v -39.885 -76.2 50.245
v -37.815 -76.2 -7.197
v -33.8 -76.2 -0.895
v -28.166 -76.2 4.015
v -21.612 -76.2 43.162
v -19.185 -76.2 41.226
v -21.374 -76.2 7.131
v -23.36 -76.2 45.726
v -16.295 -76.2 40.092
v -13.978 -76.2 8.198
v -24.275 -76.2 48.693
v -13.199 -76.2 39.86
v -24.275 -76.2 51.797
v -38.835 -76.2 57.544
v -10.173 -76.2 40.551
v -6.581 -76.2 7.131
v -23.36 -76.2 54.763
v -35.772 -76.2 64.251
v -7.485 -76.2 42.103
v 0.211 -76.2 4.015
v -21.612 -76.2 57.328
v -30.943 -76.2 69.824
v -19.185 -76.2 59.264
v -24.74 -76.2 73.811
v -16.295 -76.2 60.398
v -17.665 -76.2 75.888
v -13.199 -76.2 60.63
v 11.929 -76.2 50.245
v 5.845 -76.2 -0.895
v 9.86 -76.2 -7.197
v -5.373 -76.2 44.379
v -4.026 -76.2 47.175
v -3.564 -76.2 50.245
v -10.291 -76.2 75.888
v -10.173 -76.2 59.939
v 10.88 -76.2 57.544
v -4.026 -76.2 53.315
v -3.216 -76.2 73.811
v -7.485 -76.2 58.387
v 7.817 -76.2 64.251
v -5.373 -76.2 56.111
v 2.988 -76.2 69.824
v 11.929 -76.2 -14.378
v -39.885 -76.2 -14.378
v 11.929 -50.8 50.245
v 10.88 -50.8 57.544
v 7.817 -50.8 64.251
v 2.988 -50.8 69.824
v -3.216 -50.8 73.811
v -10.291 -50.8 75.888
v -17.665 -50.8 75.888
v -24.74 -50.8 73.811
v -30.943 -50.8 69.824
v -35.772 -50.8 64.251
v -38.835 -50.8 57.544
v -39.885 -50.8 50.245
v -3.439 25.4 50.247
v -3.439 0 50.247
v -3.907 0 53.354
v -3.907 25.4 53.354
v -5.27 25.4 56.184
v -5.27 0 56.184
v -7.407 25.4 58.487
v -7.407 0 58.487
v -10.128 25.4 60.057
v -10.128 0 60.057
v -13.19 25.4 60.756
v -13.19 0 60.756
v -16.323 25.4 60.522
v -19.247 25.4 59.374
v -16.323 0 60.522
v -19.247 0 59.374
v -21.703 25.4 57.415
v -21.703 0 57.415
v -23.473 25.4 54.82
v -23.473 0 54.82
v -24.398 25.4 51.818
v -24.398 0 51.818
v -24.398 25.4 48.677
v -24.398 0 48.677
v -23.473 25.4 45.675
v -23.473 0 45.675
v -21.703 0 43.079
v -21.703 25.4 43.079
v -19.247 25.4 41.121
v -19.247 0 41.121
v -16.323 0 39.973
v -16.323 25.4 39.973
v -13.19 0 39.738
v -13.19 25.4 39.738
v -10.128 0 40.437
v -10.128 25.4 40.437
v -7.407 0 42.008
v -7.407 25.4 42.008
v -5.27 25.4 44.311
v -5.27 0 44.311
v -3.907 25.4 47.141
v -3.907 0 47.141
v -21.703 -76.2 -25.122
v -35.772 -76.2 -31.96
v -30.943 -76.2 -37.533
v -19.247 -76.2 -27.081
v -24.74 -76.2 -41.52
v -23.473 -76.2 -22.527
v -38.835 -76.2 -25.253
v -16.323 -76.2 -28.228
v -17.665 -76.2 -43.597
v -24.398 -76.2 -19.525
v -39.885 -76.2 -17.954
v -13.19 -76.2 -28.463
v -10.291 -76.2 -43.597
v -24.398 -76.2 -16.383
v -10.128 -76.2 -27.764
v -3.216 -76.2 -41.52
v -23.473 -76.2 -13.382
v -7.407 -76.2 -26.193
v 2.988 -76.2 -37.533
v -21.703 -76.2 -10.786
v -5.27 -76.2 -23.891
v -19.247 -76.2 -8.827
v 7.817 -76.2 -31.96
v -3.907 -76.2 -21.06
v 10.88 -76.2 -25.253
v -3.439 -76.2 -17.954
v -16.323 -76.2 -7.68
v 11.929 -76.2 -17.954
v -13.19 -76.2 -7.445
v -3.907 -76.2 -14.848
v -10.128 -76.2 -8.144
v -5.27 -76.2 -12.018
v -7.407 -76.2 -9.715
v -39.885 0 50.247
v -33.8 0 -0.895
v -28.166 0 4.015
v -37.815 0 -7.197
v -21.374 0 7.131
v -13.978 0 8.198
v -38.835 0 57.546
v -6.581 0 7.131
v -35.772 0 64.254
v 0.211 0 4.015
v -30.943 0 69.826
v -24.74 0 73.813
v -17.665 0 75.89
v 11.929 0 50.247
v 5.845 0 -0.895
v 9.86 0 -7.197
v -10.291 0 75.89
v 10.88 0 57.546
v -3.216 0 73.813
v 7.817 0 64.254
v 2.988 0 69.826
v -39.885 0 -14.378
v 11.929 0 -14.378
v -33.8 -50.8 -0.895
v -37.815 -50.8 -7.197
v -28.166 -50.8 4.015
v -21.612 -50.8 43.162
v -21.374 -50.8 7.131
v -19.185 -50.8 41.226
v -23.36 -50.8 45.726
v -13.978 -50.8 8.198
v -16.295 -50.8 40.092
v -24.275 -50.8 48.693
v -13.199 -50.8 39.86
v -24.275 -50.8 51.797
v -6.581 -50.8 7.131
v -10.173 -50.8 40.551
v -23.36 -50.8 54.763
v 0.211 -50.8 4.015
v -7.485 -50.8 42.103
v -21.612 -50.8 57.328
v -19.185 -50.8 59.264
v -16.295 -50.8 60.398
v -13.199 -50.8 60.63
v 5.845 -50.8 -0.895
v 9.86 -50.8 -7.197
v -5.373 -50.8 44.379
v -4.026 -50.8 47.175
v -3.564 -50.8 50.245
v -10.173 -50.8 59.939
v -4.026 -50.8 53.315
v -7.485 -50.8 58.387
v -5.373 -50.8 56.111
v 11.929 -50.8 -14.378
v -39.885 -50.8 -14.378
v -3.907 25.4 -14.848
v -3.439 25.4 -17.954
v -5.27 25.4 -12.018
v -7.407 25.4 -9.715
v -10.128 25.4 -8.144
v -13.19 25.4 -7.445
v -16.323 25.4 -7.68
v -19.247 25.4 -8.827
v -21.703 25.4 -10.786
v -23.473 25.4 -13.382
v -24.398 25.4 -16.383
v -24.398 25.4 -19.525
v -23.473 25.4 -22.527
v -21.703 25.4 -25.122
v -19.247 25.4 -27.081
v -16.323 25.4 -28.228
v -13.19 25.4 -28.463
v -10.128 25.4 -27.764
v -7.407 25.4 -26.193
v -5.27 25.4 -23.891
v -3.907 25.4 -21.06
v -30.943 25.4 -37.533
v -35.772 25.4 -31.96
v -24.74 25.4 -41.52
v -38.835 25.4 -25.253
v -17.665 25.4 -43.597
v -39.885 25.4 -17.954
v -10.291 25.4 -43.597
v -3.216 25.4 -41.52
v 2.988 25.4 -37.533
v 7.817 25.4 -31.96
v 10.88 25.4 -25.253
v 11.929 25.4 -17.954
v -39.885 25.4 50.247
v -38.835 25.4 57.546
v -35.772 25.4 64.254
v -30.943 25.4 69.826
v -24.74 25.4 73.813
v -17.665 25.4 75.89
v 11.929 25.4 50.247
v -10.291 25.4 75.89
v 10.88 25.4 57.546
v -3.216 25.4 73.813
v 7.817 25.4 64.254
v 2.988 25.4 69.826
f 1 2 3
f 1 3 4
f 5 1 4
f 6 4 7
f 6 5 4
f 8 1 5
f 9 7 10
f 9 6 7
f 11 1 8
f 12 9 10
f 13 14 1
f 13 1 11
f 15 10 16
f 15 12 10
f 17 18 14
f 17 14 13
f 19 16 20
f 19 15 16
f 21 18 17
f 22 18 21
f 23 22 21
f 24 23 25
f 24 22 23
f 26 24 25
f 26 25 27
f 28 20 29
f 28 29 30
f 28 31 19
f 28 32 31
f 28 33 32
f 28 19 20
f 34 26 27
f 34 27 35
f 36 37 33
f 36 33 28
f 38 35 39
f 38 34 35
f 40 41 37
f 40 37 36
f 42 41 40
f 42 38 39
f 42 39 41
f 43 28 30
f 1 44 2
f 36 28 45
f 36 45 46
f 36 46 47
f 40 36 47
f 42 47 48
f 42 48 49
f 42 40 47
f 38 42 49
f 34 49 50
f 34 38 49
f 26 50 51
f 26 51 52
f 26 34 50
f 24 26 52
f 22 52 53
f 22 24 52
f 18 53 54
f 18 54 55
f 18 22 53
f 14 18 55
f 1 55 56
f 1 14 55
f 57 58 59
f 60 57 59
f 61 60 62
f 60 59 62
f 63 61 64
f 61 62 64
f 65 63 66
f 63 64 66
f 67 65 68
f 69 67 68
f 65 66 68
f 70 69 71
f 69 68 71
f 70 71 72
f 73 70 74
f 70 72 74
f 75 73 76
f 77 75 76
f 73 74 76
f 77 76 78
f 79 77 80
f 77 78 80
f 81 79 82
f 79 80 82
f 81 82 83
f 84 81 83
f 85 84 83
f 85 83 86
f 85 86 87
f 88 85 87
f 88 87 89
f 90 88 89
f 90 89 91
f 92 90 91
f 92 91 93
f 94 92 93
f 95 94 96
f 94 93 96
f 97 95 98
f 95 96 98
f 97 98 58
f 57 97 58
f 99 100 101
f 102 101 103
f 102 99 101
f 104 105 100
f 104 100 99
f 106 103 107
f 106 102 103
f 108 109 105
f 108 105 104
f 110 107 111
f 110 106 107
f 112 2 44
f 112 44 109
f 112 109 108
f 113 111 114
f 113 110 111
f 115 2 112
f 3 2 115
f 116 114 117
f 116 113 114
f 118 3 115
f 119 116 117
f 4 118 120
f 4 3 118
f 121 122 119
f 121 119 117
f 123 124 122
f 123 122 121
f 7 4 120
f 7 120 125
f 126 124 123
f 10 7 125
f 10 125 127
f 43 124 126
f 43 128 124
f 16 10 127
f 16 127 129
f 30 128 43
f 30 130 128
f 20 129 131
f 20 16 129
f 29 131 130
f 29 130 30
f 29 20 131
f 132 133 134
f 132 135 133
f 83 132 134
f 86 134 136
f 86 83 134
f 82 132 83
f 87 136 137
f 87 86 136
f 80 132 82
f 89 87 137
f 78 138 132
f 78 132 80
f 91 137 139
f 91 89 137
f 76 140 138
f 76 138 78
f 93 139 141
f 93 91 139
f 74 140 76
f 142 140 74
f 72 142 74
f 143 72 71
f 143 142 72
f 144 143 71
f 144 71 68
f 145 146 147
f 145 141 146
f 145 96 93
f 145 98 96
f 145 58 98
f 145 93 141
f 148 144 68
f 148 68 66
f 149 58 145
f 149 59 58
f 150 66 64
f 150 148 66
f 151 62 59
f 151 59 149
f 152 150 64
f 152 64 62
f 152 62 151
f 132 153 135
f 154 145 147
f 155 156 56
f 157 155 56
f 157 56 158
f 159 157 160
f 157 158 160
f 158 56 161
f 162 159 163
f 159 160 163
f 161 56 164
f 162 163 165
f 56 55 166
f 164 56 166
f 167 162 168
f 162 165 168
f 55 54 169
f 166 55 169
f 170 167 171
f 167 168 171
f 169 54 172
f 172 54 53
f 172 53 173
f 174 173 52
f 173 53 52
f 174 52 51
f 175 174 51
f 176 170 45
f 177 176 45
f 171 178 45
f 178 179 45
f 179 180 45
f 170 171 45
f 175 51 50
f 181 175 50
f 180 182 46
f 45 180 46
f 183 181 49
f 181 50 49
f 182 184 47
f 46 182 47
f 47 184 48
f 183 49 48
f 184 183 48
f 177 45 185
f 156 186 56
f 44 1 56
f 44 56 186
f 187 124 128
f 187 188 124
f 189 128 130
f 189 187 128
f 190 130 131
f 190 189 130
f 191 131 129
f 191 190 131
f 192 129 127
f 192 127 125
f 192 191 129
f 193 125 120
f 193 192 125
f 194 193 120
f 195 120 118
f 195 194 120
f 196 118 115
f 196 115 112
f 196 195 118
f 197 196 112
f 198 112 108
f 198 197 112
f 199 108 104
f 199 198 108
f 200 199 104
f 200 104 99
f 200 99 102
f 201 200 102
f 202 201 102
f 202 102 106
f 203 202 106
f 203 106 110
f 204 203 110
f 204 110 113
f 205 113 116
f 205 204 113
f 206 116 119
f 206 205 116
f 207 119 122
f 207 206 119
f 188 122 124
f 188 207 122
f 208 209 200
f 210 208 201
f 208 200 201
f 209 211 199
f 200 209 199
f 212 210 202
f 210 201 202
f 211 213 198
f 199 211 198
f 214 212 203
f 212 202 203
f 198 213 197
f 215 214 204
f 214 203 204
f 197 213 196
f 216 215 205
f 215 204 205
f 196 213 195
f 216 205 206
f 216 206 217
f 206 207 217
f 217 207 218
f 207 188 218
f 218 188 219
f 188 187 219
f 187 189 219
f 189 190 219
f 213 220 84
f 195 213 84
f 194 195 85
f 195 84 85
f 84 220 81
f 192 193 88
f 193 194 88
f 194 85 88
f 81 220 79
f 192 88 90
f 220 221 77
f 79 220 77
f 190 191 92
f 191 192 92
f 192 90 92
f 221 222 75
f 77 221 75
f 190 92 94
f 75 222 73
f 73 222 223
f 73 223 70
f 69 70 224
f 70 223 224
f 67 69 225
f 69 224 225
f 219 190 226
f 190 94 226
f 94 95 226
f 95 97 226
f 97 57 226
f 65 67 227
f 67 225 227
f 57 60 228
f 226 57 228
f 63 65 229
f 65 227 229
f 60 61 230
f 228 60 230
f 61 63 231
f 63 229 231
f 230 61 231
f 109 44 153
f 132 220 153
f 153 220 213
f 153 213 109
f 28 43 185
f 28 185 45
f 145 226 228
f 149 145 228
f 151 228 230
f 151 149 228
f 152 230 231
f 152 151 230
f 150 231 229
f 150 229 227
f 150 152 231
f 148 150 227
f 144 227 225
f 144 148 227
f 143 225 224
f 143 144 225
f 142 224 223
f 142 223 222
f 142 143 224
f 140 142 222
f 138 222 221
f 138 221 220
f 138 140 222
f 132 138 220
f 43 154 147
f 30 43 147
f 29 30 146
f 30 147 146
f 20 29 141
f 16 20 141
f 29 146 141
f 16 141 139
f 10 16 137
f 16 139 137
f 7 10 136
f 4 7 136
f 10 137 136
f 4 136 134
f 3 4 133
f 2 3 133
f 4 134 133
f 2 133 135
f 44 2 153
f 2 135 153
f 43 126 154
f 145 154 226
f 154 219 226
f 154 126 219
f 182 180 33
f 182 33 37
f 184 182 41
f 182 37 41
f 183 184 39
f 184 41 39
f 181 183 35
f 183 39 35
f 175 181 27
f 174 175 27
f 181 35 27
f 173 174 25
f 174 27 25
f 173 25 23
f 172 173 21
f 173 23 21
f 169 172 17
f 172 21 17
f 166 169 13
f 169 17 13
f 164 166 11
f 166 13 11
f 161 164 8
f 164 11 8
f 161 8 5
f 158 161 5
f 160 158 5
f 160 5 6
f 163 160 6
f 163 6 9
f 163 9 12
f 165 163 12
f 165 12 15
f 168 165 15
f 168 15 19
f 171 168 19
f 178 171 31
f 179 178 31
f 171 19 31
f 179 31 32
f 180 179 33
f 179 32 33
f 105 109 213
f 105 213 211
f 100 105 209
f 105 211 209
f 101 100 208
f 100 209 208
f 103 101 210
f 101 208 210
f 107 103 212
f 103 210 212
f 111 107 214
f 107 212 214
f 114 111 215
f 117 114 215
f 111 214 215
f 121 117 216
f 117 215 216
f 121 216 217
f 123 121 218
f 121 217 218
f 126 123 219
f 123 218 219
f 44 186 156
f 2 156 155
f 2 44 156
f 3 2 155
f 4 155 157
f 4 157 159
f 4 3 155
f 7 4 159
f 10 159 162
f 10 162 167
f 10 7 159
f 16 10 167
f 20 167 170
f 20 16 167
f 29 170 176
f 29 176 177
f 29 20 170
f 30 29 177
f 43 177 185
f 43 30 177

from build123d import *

# Parameters (mm, degrees)
F0_R     = 10.5384910473
F1_DEPTH = 25.4
F2_R     = 10.5384910473
F3_DEPTH = 76.2
F4_R     = 10.414
F5_DEPTH = 25.4


with BuildPart() as f1:
    # F0 (on Front) → F1 (new body)
    with BuildSketch(Plane.XZ):
        with BuildLine():
            Line((-39.8845039308, 50.2472445369), (-39.8845039308, 32.8956767917))
            Line((-39.8845039308, 32.8956767917), (-39.8845039308, -17.9540514946))
            ThreePointArc((-39.8845039308, -17.9540514946), (-13.977650553, -43.8609048724), (11.9292028248, -17.9540514946))
            Line((11.9292028248, -17.9540514946), (11.9292028248, 50.2472445369))
            ThreePointArc((11.9292028248, 50.2472445369), (-13.977650553, 76.1540979147), (-39.8845039308, 50.2472445369))
        make_face()
        with Locations((-13.977650553, -17.9540514946)):
            Circle(F0_R, mode=Mode.SUBTRACT)
        with Locations((-13.977650553, 50.2472445369)):
            Circle(F0_R, mode=Mode.SUBTRACT)
    extrude(amount=-F1_DEPTH)

    # F2 (on face) → F3 (join)
    with BuildSketch(Plane.XZ):
        with BuildLine():
            Line((11.9292028248, -17.9540514946), (11.9292028248, -14.3777139648))
            ThreePointArc((11.9292028248, -14.3777139648), (-13.977650553, 8.1984864715), (-39.8845039308, -14.3777139648))
            Line((-39.8845039308, -14.3777139648), (-39.8845039308, -17.9540514946))
            ThreePointArc((-39.8845039308, -17.9540514946), (-13.977650553, -43.8609048724), (11.9292028248, -17.9540514946))
        make_face()
        with Locations((-13.977650553, -17.9540514946)):
            Circle(F2_R, mode=Mode.SUBTRACT)
    extrude(amount=F3_DEPTH)


with BuildPart() as f5:
    # F4 (on face) → F5 (new body)
    with BuildSketch(Plane.XZ.offset(76.2)):
        with BuildLine():
            ThreePointArc((-39.8845039308, -14.3777139648), (-13.977650553, 8.1984864715), (11.9292028248, -14.3777139648))
            Line((11.9292028248, -14.3777139648), (11.9292028248, 50.2449485054))
            ThreePointArc((11.9292028248, 50.2449485054), (-13.977650553, 76.1518018832), (-39.8845039308, 50.2449485054))
            Line((-39.8845039308, 50.2449485054), (-39.8845039308, -14.3777139648))
        make_face()
        with Locations((-13.977650553, 50.2449485054)):
            Circle(F4_R, mode=Mode.SUBTRACT)
    extrude(amount=-F5_DEPTH)


solid = Compound([f1.part, f5.part])
